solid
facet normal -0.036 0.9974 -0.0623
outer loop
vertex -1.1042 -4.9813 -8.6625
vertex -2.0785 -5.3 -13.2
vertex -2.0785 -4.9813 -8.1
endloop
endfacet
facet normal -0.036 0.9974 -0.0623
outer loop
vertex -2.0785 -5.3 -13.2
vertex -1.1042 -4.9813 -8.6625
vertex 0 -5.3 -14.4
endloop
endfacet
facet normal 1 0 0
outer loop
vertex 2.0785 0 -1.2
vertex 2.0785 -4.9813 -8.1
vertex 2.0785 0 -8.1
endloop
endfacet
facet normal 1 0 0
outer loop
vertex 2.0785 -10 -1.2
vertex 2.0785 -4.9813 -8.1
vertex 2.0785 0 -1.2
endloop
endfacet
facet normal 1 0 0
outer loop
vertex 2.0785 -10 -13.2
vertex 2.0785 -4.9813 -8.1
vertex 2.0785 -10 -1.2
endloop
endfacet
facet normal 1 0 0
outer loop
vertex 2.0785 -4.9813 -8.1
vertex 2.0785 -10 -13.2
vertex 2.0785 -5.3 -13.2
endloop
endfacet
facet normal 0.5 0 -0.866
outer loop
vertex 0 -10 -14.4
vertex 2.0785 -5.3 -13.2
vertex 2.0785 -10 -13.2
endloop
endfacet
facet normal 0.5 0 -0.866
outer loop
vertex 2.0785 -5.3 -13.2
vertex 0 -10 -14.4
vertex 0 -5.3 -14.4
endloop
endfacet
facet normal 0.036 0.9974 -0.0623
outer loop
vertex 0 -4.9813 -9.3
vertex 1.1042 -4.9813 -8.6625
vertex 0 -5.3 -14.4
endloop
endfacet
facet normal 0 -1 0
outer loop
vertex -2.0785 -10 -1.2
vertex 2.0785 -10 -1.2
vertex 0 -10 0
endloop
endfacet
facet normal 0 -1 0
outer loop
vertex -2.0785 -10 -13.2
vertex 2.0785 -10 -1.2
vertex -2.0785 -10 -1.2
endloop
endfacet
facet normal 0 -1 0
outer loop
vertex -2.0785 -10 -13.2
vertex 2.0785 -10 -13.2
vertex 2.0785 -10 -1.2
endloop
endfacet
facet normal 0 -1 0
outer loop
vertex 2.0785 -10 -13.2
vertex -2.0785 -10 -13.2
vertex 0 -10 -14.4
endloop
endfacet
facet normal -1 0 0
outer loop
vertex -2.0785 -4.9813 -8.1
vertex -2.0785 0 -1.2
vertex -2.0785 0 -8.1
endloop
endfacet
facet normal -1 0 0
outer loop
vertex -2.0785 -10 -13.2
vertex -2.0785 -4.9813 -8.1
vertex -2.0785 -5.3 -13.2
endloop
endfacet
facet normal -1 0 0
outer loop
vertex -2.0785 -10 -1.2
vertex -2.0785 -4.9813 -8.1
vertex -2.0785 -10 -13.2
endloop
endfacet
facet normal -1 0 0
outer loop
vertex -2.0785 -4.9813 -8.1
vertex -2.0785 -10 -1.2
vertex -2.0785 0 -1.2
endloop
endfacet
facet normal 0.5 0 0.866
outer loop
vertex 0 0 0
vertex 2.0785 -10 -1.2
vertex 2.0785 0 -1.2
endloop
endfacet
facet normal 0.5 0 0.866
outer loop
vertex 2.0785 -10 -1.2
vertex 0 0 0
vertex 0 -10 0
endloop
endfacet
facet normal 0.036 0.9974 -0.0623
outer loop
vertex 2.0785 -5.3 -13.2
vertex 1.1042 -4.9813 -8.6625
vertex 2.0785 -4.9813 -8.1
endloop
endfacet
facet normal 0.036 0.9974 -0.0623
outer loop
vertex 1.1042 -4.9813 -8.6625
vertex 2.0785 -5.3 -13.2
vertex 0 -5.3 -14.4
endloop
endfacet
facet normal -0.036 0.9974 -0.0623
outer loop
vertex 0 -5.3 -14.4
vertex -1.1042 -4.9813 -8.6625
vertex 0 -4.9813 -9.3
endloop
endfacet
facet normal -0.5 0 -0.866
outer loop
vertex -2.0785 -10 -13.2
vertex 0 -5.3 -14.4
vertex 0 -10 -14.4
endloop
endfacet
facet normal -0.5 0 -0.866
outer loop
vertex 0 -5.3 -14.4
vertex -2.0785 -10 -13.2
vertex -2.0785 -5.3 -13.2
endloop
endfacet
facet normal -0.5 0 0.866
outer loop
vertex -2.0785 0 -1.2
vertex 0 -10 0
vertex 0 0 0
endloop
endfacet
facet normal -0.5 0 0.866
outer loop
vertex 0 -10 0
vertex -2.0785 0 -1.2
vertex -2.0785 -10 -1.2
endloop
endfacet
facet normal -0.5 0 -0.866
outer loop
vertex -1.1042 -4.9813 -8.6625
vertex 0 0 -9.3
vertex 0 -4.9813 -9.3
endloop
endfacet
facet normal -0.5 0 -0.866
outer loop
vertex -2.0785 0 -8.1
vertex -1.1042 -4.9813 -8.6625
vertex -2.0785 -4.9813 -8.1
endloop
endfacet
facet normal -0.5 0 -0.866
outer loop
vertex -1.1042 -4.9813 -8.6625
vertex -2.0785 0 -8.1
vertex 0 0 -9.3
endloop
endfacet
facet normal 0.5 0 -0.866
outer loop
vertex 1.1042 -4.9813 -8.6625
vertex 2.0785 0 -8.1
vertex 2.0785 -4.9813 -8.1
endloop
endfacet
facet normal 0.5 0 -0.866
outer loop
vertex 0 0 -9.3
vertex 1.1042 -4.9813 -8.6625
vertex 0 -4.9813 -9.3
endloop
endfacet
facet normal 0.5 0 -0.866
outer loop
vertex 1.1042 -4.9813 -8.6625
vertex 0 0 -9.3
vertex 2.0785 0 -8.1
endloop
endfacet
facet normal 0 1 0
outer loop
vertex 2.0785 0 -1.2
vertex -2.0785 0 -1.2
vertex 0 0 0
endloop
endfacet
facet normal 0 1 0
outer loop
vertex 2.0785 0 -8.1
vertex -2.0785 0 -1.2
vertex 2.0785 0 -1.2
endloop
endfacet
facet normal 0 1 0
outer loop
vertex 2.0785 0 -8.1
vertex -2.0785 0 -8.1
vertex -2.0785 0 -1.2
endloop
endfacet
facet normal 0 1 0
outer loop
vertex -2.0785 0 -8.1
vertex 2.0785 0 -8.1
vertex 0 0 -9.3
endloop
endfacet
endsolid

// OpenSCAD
hook();

module hook() {
  // t is the amount we reduce the width/height by to let it fit ok
  t = 0.1;
  // w = width
  w = 5;
  // wt is the width less the t
  wt = w - t * 2;
  // h is the hight less a bit to make it fit
  h = 15 - 0.3;
  // h2 is the height of the smaller part of the peg
  h2 = h - 5;
  // ht is the height less t
  ht = h - t;
  // d is the depth of the board
  d = 5;
  // 12 gives us enough facets to create a easy to print angle
  $fn = 6;

  translate([0, -d*2, -wt/2]) rotate([270, 90,0]) union() {
    // The larger part of the peg
    hull() {
      cylinder(d=wt, h=d + 0.3);
      // -0.3 is the taper applied to the face that makes contact with the back on the pegboard
      translate([ht-w, 0, 0]) cylinder(d=wt, h=d -0.3);
    }
    // The smaller part of the peg
    translate([0, 0, 0]) hull() {
      cylinder(d=wt, h = d * 2);
      translate([h2 - w - t * 2 ,0 ,0]) cylinder(d=wt, h=d * 2);
      };
  }
}
